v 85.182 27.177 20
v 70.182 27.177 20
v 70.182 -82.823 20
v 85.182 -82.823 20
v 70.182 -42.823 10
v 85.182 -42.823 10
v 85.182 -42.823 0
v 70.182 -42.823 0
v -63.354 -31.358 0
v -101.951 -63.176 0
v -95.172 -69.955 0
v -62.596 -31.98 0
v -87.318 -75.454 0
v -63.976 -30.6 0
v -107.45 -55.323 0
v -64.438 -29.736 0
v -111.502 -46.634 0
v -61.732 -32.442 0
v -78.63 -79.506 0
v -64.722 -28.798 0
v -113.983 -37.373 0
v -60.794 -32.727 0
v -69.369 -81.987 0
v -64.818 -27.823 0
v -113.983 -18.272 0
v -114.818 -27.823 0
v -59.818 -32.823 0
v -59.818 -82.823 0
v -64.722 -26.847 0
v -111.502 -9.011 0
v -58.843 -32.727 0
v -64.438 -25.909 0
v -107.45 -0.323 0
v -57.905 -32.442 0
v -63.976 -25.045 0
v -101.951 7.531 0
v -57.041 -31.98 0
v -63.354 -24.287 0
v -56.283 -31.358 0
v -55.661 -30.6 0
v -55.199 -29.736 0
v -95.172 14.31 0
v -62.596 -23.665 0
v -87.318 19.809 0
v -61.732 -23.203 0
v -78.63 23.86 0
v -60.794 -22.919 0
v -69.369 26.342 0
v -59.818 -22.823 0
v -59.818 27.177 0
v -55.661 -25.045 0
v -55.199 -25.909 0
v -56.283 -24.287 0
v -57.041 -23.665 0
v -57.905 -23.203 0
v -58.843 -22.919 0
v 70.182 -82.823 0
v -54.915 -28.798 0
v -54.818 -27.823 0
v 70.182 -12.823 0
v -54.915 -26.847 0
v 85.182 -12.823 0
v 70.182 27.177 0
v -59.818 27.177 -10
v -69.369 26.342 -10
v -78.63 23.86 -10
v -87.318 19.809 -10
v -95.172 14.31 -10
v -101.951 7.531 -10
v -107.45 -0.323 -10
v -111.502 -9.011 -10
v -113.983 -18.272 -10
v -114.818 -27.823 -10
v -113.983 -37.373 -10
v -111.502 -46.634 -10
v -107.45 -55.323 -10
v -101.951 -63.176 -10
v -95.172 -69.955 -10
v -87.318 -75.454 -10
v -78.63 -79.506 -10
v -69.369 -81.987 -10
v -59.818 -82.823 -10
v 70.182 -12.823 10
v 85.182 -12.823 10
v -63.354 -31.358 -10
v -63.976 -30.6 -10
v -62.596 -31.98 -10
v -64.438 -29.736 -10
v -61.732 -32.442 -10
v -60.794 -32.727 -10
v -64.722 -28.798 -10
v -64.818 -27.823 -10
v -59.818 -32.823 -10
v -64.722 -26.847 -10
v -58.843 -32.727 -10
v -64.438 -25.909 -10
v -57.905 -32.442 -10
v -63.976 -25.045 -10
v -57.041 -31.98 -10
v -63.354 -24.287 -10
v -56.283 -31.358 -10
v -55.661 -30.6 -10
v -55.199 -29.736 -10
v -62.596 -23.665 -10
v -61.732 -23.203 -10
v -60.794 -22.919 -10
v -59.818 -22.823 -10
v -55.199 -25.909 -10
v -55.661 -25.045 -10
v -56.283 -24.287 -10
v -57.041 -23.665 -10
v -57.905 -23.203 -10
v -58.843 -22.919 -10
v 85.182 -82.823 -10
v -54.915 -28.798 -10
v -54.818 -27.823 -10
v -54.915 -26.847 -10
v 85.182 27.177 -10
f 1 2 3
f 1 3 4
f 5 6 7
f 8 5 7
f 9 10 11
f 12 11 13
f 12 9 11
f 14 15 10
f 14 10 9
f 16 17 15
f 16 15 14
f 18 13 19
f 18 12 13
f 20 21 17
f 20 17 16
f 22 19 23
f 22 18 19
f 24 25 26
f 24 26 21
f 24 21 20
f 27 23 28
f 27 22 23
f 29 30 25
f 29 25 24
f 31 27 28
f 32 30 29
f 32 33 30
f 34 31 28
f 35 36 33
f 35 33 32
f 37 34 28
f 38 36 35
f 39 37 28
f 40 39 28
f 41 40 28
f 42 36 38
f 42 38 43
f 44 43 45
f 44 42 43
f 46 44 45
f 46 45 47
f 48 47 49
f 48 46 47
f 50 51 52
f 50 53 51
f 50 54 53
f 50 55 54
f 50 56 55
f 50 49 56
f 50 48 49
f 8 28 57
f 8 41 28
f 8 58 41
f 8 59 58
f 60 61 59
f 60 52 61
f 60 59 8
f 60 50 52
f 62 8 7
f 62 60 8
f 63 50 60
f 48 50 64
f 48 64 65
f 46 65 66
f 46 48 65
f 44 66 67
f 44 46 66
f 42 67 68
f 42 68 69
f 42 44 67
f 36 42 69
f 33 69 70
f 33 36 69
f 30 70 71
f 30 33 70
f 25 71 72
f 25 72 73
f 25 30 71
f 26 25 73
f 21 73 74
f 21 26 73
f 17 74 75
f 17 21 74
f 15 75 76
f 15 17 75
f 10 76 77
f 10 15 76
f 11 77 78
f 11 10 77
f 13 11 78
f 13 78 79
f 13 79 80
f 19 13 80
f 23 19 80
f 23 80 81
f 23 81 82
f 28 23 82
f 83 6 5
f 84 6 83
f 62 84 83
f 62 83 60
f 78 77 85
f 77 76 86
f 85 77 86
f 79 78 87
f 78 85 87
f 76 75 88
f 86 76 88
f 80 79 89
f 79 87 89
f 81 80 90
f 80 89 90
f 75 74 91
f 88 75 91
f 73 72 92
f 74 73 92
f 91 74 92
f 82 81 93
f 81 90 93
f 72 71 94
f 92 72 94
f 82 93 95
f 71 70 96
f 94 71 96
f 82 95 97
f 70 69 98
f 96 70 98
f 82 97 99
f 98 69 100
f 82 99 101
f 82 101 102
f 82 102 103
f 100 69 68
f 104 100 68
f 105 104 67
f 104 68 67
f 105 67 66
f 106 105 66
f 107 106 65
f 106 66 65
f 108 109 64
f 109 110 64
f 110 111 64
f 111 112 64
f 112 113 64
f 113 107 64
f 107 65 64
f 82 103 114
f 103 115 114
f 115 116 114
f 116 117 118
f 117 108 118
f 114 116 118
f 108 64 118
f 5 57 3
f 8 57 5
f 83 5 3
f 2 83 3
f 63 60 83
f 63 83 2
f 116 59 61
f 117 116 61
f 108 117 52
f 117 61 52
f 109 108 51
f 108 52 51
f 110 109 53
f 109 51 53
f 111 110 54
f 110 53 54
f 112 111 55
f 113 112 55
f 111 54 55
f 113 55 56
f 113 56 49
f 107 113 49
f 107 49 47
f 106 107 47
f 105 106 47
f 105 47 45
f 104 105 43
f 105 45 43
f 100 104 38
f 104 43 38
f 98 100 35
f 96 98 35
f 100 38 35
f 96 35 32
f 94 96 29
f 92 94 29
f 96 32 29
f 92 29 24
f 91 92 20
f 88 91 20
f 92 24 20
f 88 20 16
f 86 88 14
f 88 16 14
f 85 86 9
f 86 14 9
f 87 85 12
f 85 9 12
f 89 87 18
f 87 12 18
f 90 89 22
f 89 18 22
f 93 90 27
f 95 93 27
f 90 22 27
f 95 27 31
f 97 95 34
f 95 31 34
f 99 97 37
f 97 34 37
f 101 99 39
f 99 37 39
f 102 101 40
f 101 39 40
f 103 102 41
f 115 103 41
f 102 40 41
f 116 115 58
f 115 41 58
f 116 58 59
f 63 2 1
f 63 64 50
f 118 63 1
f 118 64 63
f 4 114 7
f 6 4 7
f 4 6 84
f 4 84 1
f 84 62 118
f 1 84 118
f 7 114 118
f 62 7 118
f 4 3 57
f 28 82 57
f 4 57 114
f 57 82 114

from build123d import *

# Parameters (mm, degrees)
SKETCH1_R           = 5
BOSS_EXTRUDE1_DEPTH = 10
SKETCH1_3_W         = 15
SKETCH1_3_H         = 110
BOSS_EXTRUDE2_DEPTH = 20
SKETCH2_W           = 10
SKETCH2_H           = 30
CUT_EXTRUDE1_DEPTH  = 20


with BuildPart() as part:
    # Sketch1 → Boss-Extrude1 (new body)
    with BuildSketch(Plane.XY):
        with BuildLine():
            ThreePointArc((-59.818461348, 27.177394162), (-114.818461348, -27.822605838), (-59.818461348, -82.822605838))
            Line((-59.818461348, -82.822605838), (85.181538652, -82.822605838))
            Line((85.181538652, -82.822605838), (85.181538652, 27.177394162))
            Line((85.181538652, 27.177394162), (-59.818461348, 27.177394162))
        make_face()
        with Locations((-59.818461348, -27.822605838)):
            Circle(SKETCH1_R, mode=Mode.SUBTRACT)
    extrude(amount=-BOSS_EXTRUDE1_DEPTH)

    # Sketch1<3> → Boss-Extrude2 (add)
    with BuildSketch(Plane.XY):
        with Locations((77.681538652, -27.822605838)):
            Rectangle(SKETCH1_3_W, SKETCH1_3_H)
    extrude(amount=BOSS_EXTRUDE2_DEPTH)

    # Sketch2 → Cut-Extrude1 (cut)
    with BuildSketch(Plane(origin=(85.181538652, 0, 0), x_dir=(0, 0, -1), z_dir=(1, 0, 0))):
        with Locations((-5, -27.822605838)):
            Rectangle(SKETCH2_W, SKETCH2_H)
    extrude(amount=-CUT_EXTRUDE1_DEPTH, mode=Mode.SUBTRACT)


solid = part.part
